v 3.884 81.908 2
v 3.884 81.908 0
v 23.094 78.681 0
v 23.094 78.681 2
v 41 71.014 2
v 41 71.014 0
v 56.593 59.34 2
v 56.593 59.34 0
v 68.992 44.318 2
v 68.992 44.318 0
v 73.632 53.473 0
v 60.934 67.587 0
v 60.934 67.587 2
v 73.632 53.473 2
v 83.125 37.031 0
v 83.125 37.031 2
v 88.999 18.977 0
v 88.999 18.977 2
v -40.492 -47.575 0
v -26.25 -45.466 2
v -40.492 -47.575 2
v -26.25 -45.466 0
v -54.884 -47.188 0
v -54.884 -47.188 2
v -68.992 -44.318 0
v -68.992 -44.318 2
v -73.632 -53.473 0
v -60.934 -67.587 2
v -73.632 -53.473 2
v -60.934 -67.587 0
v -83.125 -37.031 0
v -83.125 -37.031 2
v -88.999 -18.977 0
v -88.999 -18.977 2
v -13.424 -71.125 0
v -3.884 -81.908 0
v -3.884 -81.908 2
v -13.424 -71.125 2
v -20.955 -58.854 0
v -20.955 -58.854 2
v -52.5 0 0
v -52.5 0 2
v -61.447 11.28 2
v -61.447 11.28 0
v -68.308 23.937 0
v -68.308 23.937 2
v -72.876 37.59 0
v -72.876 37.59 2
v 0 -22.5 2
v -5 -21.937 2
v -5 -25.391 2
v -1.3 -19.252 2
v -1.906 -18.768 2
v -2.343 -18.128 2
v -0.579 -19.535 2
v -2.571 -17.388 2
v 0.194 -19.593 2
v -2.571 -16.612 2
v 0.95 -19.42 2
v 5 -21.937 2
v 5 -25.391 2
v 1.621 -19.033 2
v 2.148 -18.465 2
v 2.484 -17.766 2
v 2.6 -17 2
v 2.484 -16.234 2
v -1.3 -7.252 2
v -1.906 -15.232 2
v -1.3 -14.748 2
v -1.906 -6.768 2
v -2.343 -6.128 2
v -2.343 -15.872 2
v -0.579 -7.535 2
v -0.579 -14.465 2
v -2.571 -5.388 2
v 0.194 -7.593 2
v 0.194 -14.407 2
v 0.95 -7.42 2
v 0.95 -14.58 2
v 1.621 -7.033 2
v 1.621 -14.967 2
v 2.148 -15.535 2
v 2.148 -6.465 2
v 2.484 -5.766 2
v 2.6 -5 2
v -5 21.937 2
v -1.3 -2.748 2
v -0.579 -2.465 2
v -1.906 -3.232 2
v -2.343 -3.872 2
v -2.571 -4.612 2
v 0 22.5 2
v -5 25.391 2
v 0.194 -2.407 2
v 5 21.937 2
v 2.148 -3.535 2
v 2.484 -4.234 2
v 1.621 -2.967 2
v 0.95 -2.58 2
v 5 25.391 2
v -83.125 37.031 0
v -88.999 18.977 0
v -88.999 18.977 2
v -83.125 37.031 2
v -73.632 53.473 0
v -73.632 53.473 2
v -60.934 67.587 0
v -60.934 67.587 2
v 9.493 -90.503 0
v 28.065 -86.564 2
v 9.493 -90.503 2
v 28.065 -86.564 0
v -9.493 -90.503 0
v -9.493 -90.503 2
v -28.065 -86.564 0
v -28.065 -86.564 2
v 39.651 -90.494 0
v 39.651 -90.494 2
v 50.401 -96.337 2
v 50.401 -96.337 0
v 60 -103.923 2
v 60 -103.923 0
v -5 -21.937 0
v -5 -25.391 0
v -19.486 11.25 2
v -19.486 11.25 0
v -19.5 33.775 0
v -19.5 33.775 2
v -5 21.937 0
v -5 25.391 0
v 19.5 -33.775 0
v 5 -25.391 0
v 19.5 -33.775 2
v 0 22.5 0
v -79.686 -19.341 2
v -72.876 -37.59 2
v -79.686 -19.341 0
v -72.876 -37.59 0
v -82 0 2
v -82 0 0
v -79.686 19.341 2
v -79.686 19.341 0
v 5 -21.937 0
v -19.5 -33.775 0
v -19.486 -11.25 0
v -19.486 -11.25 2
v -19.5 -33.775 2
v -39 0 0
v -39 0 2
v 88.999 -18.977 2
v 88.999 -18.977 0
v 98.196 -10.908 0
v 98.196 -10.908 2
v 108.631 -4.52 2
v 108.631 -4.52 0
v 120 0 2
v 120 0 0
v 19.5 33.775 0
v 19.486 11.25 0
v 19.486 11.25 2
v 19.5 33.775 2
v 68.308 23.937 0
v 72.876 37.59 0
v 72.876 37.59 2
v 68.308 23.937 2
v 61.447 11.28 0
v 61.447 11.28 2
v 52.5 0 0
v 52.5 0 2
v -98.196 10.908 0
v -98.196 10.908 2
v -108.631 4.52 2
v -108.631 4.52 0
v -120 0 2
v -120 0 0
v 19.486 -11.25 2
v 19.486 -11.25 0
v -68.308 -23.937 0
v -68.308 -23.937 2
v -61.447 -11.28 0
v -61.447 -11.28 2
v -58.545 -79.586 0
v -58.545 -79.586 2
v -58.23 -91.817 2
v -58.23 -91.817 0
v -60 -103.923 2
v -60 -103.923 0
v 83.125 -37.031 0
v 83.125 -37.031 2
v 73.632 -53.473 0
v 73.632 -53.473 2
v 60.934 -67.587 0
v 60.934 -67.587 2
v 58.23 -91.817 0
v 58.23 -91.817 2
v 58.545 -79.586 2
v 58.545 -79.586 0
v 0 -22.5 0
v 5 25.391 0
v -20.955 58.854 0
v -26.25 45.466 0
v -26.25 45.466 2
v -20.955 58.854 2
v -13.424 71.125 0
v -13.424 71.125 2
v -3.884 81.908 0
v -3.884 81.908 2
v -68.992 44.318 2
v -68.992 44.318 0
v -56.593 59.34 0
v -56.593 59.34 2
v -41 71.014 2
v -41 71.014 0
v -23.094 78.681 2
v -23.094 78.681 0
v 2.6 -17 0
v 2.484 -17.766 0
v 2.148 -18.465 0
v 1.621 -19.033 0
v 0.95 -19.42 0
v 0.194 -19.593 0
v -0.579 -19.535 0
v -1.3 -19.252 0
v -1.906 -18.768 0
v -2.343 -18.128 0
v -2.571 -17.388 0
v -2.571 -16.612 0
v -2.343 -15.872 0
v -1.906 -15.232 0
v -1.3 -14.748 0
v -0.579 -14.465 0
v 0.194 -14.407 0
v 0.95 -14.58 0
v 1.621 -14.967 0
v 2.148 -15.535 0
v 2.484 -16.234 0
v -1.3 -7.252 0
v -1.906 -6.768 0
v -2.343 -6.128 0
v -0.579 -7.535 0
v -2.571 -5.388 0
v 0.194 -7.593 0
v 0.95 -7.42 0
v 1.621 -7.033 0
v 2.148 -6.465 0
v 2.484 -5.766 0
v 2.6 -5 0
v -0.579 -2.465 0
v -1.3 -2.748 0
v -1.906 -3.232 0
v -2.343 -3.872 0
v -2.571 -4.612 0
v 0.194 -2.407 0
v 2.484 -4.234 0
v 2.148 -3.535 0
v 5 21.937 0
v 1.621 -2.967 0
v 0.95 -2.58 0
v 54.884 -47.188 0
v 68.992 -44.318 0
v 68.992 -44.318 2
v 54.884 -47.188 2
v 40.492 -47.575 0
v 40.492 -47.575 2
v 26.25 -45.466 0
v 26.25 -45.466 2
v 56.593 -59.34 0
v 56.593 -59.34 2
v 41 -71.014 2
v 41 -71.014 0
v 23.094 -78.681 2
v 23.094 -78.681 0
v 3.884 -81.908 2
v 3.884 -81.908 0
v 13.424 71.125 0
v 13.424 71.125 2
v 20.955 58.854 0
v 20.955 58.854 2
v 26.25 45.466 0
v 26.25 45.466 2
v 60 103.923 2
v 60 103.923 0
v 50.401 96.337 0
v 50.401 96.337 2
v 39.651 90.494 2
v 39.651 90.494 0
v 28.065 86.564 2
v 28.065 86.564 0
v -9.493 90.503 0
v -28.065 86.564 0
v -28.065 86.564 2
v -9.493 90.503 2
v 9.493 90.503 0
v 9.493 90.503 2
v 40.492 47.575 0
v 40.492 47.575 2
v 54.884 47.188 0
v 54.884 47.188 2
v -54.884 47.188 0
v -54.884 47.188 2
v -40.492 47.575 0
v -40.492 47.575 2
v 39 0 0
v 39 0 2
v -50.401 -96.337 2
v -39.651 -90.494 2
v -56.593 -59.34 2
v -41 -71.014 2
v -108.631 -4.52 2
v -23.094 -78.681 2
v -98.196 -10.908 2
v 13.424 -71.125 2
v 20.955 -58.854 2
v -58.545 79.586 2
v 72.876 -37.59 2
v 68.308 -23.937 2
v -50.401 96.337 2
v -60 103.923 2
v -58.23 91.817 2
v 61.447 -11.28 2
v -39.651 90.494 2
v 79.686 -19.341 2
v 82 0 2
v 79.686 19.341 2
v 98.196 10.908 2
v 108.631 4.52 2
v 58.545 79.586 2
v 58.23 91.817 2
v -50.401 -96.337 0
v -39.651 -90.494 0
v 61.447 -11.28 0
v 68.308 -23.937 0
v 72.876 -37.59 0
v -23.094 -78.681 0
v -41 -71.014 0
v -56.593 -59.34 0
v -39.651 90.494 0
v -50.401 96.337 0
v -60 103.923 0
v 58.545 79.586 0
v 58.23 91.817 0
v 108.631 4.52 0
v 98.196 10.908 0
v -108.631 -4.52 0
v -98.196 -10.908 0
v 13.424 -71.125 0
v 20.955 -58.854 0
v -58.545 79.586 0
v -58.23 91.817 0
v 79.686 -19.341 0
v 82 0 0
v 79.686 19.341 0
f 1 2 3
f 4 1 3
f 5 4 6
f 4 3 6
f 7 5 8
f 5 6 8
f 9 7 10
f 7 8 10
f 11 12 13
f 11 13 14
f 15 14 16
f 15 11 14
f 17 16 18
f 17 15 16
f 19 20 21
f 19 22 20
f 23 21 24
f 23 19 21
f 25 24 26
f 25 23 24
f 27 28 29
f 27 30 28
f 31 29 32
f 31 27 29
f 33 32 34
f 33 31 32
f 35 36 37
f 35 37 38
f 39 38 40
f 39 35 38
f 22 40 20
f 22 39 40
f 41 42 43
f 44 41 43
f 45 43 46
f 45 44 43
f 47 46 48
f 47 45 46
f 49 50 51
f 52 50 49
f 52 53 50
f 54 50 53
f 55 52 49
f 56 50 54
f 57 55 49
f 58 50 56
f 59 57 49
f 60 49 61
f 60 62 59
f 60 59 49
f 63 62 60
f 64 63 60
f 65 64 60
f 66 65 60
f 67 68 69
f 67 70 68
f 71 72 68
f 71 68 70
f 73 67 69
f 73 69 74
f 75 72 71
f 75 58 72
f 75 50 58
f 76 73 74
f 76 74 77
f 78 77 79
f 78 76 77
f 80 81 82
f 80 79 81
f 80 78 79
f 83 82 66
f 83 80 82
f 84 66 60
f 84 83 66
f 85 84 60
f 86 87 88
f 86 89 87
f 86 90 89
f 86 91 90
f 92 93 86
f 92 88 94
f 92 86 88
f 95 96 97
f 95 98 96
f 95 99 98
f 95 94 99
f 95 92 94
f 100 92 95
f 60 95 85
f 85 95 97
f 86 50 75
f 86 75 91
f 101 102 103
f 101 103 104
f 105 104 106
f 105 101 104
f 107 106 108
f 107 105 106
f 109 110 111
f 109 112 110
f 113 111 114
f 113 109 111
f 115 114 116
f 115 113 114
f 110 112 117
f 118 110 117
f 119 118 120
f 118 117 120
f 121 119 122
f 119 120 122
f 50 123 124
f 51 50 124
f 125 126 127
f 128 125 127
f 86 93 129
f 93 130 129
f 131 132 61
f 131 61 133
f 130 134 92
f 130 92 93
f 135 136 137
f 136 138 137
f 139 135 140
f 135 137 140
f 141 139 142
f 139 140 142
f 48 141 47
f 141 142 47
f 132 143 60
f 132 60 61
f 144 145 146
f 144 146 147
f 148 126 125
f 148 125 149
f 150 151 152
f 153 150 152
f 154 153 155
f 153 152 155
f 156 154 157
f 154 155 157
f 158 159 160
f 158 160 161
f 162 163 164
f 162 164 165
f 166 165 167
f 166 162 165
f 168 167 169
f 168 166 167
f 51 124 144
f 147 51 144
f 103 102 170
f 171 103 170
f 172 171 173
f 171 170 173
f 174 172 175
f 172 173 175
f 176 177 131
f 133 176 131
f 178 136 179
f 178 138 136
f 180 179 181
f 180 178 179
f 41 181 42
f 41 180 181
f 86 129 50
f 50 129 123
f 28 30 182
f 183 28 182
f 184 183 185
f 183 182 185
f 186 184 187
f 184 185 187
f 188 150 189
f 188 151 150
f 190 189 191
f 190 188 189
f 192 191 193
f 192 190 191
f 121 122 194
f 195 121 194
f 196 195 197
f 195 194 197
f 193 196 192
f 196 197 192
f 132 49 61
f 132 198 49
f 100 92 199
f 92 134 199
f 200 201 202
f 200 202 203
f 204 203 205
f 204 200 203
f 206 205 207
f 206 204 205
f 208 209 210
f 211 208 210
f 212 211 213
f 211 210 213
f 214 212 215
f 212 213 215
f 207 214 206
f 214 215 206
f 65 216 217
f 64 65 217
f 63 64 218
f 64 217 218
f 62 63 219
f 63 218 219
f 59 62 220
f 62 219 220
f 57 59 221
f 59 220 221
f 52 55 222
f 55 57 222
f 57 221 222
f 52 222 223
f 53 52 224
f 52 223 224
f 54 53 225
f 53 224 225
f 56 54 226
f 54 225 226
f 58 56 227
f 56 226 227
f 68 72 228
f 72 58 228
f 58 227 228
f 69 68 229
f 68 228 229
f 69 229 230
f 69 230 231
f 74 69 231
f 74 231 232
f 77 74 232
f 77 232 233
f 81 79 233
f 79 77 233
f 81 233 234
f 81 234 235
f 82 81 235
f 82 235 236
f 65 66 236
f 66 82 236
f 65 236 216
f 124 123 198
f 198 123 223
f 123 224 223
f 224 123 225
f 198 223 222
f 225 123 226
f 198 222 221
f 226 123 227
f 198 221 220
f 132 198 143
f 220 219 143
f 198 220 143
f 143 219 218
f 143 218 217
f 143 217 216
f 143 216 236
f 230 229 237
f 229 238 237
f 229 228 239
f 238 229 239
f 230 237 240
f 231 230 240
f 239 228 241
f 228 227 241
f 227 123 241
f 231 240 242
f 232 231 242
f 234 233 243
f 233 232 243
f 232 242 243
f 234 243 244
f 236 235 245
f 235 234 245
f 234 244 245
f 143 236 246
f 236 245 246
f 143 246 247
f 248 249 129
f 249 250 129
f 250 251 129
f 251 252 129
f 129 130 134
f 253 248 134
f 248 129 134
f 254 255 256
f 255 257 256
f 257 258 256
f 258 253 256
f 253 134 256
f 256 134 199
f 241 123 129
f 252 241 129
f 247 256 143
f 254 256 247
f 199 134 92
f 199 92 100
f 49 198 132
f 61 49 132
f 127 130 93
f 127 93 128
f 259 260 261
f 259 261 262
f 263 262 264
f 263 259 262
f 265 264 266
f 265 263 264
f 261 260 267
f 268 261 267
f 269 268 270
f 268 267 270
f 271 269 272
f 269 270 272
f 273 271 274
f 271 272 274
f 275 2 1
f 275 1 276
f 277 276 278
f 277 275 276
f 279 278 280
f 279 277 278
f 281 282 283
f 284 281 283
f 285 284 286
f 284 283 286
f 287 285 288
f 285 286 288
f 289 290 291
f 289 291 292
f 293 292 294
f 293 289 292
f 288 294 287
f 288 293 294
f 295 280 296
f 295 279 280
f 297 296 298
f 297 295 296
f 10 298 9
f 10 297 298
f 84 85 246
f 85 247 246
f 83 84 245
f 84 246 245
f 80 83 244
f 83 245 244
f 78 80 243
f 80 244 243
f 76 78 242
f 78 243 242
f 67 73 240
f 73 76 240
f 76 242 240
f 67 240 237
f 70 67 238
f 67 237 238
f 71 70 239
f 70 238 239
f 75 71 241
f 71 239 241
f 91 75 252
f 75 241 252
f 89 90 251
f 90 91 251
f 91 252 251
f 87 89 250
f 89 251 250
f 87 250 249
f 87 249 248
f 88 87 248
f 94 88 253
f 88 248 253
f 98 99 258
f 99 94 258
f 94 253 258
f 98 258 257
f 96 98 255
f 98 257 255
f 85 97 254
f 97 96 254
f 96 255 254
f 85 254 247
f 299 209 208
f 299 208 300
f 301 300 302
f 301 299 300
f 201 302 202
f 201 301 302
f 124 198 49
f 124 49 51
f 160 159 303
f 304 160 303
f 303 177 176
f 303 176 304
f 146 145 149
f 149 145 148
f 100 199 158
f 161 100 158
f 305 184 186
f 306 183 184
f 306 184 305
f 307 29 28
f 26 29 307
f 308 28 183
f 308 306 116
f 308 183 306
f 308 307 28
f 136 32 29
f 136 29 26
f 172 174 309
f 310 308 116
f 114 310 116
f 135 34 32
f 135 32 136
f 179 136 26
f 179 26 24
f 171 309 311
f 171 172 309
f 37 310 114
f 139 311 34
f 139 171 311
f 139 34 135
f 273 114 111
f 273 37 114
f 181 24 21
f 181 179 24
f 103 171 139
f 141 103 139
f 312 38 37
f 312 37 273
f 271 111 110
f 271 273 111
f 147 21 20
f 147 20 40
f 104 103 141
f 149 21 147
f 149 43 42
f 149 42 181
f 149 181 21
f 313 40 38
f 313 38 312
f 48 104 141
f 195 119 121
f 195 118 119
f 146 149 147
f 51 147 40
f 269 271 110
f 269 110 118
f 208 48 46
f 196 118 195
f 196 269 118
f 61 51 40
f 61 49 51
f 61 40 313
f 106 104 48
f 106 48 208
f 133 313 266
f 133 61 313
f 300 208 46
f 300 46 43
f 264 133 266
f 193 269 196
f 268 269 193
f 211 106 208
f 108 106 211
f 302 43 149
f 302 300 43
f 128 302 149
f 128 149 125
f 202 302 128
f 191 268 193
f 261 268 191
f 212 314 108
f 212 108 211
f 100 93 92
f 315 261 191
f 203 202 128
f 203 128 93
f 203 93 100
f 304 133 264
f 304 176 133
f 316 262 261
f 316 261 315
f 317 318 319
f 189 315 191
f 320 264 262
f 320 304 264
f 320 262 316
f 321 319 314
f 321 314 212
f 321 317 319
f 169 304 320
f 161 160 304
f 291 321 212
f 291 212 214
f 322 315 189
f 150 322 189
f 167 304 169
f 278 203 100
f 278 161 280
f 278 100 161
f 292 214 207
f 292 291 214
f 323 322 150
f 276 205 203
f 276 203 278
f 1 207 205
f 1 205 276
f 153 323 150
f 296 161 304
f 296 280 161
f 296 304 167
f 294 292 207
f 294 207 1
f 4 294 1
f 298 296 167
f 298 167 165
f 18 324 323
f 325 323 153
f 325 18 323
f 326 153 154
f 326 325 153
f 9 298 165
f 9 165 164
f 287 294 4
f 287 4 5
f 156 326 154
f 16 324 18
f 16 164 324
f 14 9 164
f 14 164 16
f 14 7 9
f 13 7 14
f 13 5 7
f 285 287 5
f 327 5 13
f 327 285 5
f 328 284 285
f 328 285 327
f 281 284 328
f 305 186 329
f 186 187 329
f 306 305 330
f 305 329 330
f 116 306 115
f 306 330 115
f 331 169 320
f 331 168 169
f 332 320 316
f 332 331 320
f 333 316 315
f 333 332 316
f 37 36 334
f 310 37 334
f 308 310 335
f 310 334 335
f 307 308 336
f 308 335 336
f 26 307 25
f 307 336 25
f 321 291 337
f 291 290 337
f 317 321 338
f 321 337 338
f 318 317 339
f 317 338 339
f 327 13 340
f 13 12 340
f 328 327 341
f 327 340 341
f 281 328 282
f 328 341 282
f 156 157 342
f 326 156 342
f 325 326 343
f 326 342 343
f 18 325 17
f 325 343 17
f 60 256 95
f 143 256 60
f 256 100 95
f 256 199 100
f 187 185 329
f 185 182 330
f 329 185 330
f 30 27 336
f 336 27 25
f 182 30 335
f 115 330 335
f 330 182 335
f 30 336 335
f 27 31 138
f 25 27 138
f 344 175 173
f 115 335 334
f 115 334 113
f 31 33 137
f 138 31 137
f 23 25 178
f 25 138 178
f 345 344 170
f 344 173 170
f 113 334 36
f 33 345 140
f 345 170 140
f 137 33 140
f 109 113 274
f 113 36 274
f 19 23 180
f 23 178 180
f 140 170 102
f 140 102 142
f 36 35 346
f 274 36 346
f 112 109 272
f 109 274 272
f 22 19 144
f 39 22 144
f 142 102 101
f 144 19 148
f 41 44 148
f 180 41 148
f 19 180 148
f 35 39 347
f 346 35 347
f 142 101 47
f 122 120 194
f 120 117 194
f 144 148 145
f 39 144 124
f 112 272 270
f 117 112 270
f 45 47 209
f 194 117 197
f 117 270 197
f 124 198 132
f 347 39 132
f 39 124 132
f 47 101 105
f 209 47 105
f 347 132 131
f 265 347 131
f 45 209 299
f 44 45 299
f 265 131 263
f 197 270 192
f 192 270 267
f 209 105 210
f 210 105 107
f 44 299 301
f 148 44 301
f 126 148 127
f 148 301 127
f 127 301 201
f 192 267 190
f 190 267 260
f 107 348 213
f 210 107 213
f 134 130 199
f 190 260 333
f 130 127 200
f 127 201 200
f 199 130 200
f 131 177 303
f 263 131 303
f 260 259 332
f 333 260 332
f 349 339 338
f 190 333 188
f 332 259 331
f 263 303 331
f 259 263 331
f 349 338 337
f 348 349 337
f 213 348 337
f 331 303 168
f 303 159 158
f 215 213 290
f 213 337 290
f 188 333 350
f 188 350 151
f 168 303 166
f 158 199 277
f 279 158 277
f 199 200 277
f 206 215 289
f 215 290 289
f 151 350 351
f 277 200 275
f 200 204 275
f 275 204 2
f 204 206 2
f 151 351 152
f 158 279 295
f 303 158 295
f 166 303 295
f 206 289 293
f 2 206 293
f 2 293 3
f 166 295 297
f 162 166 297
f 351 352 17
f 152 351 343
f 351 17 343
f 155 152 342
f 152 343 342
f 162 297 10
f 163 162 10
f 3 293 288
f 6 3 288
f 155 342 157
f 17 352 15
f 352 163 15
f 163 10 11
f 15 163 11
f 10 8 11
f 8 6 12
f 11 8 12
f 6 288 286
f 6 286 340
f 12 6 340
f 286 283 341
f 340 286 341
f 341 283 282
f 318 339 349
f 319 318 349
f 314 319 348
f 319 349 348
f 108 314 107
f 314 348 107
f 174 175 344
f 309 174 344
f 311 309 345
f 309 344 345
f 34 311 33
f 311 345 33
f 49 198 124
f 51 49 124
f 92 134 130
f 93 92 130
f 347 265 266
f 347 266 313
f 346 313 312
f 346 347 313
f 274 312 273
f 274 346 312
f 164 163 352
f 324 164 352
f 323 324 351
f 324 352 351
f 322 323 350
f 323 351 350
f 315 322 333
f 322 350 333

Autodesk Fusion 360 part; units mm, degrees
sketch "スケッチ1" plane through (0, 0, 0) normal (0, 0, 1) x (1, 0, 0)
  circle A0 centre (0, 0) radius 120 construction
  circle A1 centre (0, 0) radius 39 construction
  line L0 (0, 0) -> (120, 0) construction
  line L1 (0, 0) -> (26.25, 45.4663) construction
  line L2 (0, 0) -> (0, 22.5) construction
  line L3 (0, 22.5) -> (19.5, 33.775)
  line L4 (0, 0) -> (19.4856, 11.25) construction
  line L5 (19.4856, 11.25) -> (19.5, 33.775)
  line L6 (-19.4856, 11.25) -> (-19.5, 33.775)
  line L7 (0, 22.5) -> (-19.5, 33.775)
  line L8 (-19.4856, -11.25) -> (-39, 0)
  line L9 (-19.4856, 11.25) -> (-39, 0)
  line L10 (0, -22.5) -> (-19.5, -33.775)
  line L11 (-19.4856, -11.25) -> (-19.5, -33.775)
  line L12 (19.4856, -11.25) -> (19.5, -33.775)
  line L13 (0, -22.5) -> (19.5, -33.775)
  line L14 (19.4856, 11.25) -> (39, 0)
  line L15 (19.4856, -11.25) -> (39, 0)
  circle A2 centre (0, 0) radius 52.5 construction
  arc A3 (26.25, 45.4663) -> (3.8842, 81.908) centre (-53.2195, 21.7768) ccw
  arc A4 (-3.8842, 81.908) -> (-26.25, 45.4663) centre (53.2195, 21.7768) ccw
  arc A5 (-26.25, 45.4663) -> (-68.9922, 44.3178) centre (-45.469, -35.201) ccw
  arc A6 (-72.8765, 37.5901) -> (-52.5, 0) centre (7.7505, 56.9778) ccw
  arc A7 (-52.5, 0) -> (-72.8765, -37.5901) centre (7.7505, -56.9778) ccw
  arc A8 (-68.9922, -44.3178) -> (-26.25, -45.4663) centre (-45.469, 35.201) ccw
  arc A9 (-26.25, -45.4663) -> (-3.8842, -81.908) centre (53.2195, -21.7768) ccw
  arc A10 (3.8842, -81.908) -> (26.25, -45.4663) centre (-53.2195, -21.7768) ccw
  arc A11 (26.25, -45.4663) -> (68.9922, -44.3178) centre (45.469, 35.201) ccw
  arc A12 (72.8765, -37.5901) -> (52.5, 0) centre (-7.7505, -56.9778) ccw
  arc A13 (52.5, 0) -> (72.8765, 37.5901) centre (-7.7505, 56.9778) ccw
  arc A14 (68.9922, 44.3178) -> (26.25, 45.4663) centre (45.469, -35.201) ccw
  arc A15 (-3.8842, 81.908) -> (-68.9922, 44.3178) centre (0, 0) ccw
  arc A16 (-72.8765, 37.5901) -> (-72.8765, -37.5901) centre (0, 0) ccw
  arc A17 (-68.9922, -44.3178) -> (-3.8842, -81.908) centre (0, 0) ccw
  arc A18 (3.8842, -81.908) -> (68.9922, -44.3178) centre (0, 0) ccw
  arc A19 (72.8765, -37.5901) -> (72.8765, 37.5901) centre (0, 0) ccw
  arc A20 (68.9922, 44.3178) -> (3.8842, 81.908) centre (0, 0) ccw
  arc A21 (88.9993, 18.977) -> (120, 0) centre (140.7063, 68.6354) ccw
  arc A22 (120, 0) -> (88.9993, -18.977) centre (140.7063, -68.6354) ccw
  arc A23 (28.0651, 86.5641) -> (60, 103.923) centre (10.9132, 156.1729) ccw
  arc A24 (60, 103.923) -> (60.9342, 67.5871) centre (129.7931, 87.5375) ccw
  arc A25 (-60.9342, 67.5871) -> (-60, 103.923) centre (-129.7931, 87.5375) ccw
  arc A26 (-60, 103.923) -> (-28.0651, 86.5641) centre (-10.9132, 156.1729) ccw
  arc A27 (-88.9993, -18.977) -> (-120, 0) centre (-140.7063, -68.6354) ccw
  arc A28 (-120, 0) -> (-88.9993, 18.977) centre (-140.7063, 68.6354) ccw
  arc A29 (-28.0651, -86.5641) -> (-60, -103.923) centre (-10.9132, -156.1729) ccw
  arc A30 (-60, -103.923) -> (-60.9342, -67.5871) centre (-129.7931, -87.5375) ccw
  arc A31 (60.9342, -67.5871) -> (60, -103.923) centre (129.7931, -87.5375) ccw
  arc A32 (60, -103.923) -> (28.0651, -86.5641) centre (10.9132, -156.1729) ccw
  arc A33 (28.0651, 86.5641) -> (-28.0651, 86.5641) centre (0, 0) ccw
  arc A34 (88.9993, 18.977) -> (60.9342, 67.5871) centre (0, 0) ccw
  arc A35 (60.9342, -67.5871) -> (88.9993, -18.977) centre (0, 0) ccw
  arc A36 (-28.0651, -86.5641) -> (28.0651, -86.5641) centre (0, 0) ccw
  arc A37 (-60.9342, 67.5871) -> (-88.9993, 18.977) centre (0, 0) ccw
  arc A38 (-88.9993, -18.977) -> (-60.9342, -67.5871) centre (0, 0) ccw
  line L16 (-5, 25.391) -> (-5, -25.391)
  line L17 (5, 25.391) -> (5, -25.391)
  circle A39 centre (0, -17) radius 2.6
  circle A40 centre (0, -5) radius 2.6
  arc A41 (-5, 21.9374) -> (-5, -21.9374) centre (0, 0) ccw
  arc A42 (5, -21.9374) -> (5, 21.9374) centre (0, 0) ccw
  dimension "d2" = 240
  dimension "d3" = 182
  dimension "d4" = 164
  dimension "d5" = 78
  dimension "d6" = 45
  dimension "d7" = 60
  dimension "d9" = 360
  dimension "d10" = 105
  dimension "d12" = 360
  dimension "d14" = 360
  dimension "d17" = 10
  dimension "d18" = 5.2
  dimension "d19" = 5.2
extrude "押し出し2" add sketch "スケッチ1" along normal blind 2 contours A21 A22 A23 A24 A25 A26 A27 A28 A29 A30 A31 A32 A33 A34 A35 A36 A37 A38 makes body 1
extrude "押し出し3" add sketch "スケッチ1" along normal blind 2 separate body contours L3 L7 L10 L13 L16 L17 makes body 2
extrude "押し出し1" [suppressed]
equation "d4 = d3 - 18 mm"
